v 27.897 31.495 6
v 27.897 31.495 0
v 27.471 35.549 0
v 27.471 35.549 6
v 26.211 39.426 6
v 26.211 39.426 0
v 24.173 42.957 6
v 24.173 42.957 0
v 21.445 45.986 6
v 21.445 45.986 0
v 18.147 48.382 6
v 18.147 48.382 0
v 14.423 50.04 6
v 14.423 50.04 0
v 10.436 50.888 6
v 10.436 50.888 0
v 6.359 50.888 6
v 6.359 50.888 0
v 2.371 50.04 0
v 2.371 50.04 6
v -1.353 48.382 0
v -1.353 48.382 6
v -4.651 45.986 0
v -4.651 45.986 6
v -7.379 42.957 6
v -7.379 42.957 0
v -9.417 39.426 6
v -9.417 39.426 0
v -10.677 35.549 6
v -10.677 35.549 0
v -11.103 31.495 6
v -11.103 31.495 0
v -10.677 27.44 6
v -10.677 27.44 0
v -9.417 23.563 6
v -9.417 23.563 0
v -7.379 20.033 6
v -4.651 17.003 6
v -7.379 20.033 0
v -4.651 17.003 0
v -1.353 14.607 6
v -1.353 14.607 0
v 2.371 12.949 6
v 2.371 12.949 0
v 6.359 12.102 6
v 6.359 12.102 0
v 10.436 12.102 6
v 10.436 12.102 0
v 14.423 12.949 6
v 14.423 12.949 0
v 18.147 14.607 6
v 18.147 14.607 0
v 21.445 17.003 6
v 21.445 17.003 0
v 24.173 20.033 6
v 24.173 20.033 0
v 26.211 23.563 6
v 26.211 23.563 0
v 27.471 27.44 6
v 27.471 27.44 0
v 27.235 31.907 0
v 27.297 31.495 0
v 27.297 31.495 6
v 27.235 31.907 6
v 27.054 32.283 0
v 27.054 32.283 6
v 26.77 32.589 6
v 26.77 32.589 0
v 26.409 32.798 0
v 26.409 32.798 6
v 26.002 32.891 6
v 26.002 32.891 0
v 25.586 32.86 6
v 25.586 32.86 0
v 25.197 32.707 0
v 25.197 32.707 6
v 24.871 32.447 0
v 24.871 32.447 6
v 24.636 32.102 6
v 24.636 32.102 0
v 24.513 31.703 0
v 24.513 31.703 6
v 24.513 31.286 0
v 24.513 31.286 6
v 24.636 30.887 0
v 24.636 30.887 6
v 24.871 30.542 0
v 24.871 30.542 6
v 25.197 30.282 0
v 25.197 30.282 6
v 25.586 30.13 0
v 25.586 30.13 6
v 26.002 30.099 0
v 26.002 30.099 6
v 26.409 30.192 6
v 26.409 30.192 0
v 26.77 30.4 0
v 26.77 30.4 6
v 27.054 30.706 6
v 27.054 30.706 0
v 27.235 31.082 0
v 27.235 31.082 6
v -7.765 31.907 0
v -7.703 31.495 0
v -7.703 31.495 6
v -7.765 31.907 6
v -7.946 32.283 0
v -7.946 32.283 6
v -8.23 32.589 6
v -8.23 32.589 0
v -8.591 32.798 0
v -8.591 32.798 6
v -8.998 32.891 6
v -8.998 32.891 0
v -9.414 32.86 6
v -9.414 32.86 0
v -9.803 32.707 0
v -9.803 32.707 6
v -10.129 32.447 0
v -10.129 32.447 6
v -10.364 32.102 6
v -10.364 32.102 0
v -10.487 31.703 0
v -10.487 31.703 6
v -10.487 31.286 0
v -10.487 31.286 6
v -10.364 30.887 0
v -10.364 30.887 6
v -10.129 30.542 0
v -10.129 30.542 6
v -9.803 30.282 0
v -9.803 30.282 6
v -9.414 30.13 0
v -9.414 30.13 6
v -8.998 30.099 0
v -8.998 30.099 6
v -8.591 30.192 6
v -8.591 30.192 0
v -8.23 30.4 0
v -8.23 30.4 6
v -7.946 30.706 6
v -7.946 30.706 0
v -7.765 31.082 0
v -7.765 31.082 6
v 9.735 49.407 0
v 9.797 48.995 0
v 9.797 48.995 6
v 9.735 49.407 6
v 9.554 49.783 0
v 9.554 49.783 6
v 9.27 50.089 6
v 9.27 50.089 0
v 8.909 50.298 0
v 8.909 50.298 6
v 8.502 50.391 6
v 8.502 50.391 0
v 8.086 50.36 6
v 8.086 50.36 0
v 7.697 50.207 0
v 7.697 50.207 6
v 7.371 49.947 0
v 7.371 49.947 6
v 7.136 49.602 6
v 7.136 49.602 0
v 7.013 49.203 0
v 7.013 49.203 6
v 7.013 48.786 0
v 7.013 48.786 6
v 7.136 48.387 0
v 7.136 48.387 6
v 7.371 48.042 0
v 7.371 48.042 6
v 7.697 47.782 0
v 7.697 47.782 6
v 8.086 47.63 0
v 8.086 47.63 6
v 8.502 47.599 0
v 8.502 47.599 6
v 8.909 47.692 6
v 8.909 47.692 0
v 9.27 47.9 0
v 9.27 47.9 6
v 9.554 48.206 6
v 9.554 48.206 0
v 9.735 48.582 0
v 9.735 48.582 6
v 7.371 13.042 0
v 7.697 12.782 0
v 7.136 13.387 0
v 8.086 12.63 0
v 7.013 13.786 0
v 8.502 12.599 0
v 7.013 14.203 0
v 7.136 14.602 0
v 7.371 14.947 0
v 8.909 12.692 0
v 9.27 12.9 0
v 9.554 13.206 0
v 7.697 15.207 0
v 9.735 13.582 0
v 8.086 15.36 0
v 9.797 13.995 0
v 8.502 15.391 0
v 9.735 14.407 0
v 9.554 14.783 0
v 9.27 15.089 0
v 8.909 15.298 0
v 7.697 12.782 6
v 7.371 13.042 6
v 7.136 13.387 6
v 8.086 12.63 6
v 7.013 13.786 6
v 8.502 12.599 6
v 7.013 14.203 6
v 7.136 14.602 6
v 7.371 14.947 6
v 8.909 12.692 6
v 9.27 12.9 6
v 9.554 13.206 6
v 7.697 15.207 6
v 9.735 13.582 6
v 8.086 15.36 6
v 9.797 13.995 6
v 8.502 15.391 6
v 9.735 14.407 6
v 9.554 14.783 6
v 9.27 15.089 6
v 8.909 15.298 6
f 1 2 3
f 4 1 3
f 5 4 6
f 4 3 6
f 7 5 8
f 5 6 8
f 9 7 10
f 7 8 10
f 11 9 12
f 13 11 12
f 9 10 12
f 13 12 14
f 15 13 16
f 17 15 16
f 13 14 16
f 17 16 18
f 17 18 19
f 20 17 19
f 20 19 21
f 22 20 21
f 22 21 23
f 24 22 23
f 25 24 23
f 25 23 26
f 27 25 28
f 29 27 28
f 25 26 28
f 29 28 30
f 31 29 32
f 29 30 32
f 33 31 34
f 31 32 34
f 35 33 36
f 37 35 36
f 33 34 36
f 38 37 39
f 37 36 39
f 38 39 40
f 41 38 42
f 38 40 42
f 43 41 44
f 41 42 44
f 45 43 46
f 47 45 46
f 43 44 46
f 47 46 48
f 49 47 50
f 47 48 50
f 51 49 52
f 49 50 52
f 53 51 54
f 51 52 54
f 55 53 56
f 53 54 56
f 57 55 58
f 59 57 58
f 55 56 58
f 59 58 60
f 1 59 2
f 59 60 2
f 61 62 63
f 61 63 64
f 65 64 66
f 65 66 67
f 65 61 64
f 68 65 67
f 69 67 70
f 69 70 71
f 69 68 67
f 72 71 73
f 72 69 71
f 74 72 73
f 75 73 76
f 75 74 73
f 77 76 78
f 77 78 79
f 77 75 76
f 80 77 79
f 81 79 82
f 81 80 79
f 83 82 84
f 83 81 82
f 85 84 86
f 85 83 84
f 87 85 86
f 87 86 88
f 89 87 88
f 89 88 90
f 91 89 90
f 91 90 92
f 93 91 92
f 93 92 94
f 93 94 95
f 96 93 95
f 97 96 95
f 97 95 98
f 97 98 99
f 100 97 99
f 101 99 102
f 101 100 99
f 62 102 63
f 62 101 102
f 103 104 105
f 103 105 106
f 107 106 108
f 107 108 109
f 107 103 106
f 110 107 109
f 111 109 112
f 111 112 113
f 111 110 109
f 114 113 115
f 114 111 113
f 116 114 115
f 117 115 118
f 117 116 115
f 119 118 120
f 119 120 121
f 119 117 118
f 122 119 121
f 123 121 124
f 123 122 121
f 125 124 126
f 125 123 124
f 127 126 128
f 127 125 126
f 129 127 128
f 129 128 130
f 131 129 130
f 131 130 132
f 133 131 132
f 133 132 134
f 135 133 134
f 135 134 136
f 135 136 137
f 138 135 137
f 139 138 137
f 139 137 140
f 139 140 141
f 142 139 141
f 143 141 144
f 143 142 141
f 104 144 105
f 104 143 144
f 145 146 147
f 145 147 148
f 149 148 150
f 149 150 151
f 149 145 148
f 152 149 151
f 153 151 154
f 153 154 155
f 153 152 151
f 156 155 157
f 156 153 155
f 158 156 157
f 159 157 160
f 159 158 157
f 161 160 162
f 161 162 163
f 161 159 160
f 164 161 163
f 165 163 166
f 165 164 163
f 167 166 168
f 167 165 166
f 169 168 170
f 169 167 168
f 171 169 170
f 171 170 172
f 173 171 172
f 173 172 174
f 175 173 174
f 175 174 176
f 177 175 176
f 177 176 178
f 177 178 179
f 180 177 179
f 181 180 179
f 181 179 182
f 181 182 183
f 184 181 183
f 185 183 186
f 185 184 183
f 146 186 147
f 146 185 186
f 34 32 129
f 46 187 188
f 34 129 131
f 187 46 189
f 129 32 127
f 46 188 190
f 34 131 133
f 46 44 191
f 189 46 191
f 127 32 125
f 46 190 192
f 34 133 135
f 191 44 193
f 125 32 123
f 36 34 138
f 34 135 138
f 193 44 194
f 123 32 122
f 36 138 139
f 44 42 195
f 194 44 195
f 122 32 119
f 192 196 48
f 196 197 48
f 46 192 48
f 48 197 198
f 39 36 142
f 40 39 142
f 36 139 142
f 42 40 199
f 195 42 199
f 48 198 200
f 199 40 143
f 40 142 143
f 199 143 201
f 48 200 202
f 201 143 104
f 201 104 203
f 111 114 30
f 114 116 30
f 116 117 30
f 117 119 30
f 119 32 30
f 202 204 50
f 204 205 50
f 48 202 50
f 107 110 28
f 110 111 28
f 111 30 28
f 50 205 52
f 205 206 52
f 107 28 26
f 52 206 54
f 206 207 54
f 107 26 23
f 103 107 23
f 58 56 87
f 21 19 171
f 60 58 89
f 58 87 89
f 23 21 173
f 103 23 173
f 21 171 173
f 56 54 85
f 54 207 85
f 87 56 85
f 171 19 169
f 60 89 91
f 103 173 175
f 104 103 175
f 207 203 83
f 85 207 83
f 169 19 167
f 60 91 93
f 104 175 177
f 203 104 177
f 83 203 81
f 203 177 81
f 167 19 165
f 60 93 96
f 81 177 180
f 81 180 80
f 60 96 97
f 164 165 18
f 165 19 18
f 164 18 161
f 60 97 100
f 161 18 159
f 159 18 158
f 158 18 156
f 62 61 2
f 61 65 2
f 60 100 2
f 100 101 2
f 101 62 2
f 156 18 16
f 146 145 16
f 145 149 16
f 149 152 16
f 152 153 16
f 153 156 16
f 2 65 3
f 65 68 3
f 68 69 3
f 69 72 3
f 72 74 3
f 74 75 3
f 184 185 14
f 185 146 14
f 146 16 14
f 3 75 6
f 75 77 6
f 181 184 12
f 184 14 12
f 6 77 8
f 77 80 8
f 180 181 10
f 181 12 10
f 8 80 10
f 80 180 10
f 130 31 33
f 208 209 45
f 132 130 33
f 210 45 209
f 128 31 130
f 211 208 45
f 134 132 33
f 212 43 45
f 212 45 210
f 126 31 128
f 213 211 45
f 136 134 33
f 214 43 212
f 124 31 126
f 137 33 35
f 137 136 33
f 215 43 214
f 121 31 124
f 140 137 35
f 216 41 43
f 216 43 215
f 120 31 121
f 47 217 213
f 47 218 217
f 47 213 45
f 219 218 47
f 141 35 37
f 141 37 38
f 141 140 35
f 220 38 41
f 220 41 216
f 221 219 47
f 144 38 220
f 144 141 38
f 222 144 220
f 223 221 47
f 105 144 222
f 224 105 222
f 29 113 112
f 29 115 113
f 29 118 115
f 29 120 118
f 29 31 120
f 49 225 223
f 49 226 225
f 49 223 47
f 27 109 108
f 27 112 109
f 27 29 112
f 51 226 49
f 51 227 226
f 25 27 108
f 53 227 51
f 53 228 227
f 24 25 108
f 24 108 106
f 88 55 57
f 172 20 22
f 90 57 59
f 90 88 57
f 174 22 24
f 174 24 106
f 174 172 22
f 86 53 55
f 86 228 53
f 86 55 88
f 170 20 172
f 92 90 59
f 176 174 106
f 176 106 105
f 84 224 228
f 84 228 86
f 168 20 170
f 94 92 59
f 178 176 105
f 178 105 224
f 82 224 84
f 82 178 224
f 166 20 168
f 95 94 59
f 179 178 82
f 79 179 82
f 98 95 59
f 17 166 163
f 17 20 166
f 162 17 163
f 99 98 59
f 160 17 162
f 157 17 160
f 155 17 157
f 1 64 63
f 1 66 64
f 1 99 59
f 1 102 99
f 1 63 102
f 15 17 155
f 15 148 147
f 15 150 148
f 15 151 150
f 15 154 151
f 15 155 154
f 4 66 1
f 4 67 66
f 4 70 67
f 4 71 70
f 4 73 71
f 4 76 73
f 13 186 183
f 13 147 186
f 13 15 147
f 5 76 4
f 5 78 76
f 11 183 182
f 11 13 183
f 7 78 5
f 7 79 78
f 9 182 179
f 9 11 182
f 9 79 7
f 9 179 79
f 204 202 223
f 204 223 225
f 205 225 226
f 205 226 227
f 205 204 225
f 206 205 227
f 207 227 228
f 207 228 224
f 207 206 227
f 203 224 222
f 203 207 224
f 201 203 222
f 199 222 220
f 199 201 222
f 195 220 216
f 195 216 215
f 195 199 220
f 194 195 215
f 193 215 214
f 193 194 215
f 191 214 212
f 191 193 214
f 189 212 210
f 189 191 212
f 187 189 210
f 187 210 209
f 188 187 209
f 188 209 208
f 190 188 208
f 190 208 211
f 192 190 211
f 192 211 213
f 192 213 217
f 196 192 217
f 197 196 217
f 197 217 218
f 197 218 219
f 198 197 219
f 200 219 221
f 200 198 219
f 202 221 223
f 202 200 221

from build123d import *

# Parameters (mm, degrees)
SKETCH1_R           = 19.5
SKETCH1_R_2         = 1.4
BOSS_EXTRUDE1_DEPTH = 6


with BuildPart() as part:
    # Sketch1 → Boss-Extrude1 (new body)
    with BuildSketch(Plane.XY):
        with Locations((8.397290399, 31.494734579)):
            Circle(SKETCH1_R)
        with Locations((8.397290399, 48.994734579)):
            Circle(SKETCH1_R_2, mode=Mode.SUBTRACT)
        with Locations((-9.102709601, 31.494734579)):
            Circle(SKETCH1_R_2, mode=Mode.SUBTRACT)
        with Locations((8.397290399, 13.994734579)):
            Circle(SKETCH1_R_2, mode=Mode.SUBTRACT)
        with Locations((25.897290399, 31.494734579)):
            Circle(SKETCH1_R_2, mode=Mode.SUBTRACT)
    extrude(amount=BOSS_EXTRUDE1_DEPTH)


solid = part.part
